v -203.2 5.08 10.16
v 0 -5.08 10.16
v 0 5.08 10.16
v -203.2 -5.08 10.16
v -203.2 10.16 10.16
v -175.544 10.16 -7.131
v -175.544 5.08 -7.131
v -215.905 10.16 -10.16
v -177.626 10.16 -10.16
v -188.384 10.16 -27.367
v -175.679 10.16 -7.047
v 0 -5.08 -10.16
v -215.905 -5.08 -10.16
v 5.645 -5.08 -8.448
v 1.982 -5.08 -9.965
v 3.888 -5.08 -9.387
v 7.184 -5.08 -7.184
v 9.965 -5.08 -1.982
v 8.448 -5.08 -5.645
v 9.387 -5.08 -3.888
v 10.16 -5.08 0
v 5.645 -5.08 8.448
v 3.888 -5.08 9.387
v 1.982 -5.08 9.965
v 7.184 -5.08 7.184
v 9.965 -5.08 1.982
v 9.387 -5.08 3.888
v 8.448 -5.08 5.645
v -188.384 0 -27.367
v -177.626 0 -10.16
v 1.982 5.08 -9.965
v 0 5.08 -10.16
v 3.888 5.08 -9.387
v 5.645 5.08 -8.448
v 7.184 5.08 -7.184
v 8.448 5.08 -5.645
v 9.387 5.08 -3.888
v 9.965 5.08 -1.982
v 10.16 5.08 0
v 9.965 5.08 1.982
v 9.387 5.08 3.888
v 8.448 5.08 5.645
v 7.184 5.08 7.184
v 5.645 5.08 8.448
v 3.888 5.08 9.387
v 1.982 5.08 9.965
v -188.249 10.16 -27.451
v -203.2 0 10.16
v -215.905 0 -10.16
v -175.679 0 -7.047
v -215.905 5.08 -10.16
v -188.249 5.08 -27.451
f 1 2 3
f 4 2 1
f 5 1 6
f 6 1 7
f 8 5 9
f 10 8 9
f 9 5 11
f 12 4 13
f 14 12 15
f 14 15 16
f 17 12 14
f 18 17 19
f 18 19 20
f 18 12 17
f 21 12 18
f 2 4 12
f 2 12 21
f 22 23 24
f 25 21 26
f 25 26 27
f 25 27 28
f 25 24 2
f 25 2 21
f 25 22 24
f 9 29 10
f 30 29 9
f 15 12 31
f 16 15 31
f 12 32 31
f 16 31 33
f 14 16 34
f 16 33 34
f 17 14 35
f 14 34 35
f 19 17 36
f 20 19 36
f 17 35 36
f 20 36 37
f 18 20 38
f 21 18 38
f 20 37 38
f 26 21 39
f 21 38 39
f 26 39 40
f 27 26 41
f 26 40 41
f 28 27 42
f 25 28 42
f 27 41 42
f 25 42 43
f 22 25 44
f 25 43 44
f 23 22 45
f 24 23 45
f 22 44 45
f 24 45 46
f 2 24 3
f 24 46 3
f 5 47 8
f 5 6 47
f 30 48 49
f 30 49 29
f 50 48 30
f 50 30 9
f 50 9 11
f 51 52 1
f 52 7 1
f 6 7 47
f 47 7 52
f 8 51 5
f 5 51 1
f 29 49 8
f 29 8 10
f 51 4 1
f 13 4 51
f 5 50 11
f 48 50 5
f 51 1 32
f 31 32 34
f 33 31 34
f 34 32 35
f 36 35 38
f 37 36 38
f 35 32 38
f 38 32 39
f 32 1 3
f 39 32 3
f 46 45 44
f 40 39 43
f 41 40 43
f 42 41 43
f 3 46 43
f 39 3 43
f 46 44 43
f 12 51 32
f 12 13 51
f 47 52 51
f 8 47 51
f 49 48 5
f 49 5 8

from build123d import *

# Parameters (mm, degrees)
F1_DEPTH = 5.08
F2_DEPTH = 5.08
F4_DEPTH = 5.08
F5_DEPTH = 10.16


with BuildPart() as f1:
    # F0 (on Front) → F1 (new body, symmetric)
    with BuildSketch(Plane.XZ):
        with BuildLine():
            Line((0, -10.16), (0, 10.16))
            ThreePointArc((0, 10.16), (-10.16, 0), (0, -10.16))
        make_face()
        with BuildLine():
            ThreePointArc((0, -10.16), (7.1842048969, -7.1842048969), (10.16, 0))
            ThreePointArc((10.16, 0), (7.1842048969, 7.1842048969), (0, 10.16))
            Line((0, 10.16), (0, -10.16))
        make_face()
    extrude(amount=F1_DEPTH, both=True)

    # F0 (on Front) → F2 (join, symmetric)
    with BuildSketch(Plane.XZ):
        with BuildLine():
            ThreePointArc((0, -10.16), (-10.16, 0), (0, 10.16))
            Line((0, 10.16), (-203.2, 10.16))
            Line((-203.2, 10.16), (-175.6791061841, -7.0468231431))
            Line((-175.6791061841, -7.0468231431), (-177.6255503639, -10.16))
            Line((-177.6255503639, -10.16), (-140.5866057448, -10.16))
            Line((-140.5866057448, -10.16), (0, -10.16))
        make_face()
        Polygon((-203.2, -10.16), (-203.2, 10.16), (-215.9046253878, -10.16), align=None)
        Polygon((-175.6791061841, -7.0468231431), (-203.2, 10.16), (-203.2, -10.16), (-177.6255503639, -10.16), align=None)
    extrude(amount=F2_DEPTH, both=True)


with BuildPart() as f4:
    # F3 (on face) → F4 (new body)
    with BuildSketch(Plane(origin=(0, 5.08, 0), x_dir=(-1, 0, 0), z_dir=(0, 1, 0))):
        Polygon((188.2487500092, -27.4512173453), (215.9046253878, -10.16), (203.2, 10.16), (175.5441246214, -7.1312173453), align=None)
    extrude(amount=F4_DEPTH)


with BuildPart() as f5:
    # F0 (on Front) → F5 (new body)
    with BuildSketch(Plane.XZ):
        Polygon((-203.2, -10.16), (-203.2, 10.16), (-215.9046253878, -10.16), align=None)
        Polygon((-177.6255503639, -10.16), (-203.2, -10.16), (-215.9046253878, -10.16), (-188.3837315719, -27.3668231431), align=None)
        Polygon((-175.6791061841, -7.0468231431), (-203.2, 10.16), (-203.2, -10.16), (-177.6255503639, -10.16), align=None)
    extrude(amount=-F5_DEPTH)


solid = Compound([f1.part, f4.part, f5.part])
